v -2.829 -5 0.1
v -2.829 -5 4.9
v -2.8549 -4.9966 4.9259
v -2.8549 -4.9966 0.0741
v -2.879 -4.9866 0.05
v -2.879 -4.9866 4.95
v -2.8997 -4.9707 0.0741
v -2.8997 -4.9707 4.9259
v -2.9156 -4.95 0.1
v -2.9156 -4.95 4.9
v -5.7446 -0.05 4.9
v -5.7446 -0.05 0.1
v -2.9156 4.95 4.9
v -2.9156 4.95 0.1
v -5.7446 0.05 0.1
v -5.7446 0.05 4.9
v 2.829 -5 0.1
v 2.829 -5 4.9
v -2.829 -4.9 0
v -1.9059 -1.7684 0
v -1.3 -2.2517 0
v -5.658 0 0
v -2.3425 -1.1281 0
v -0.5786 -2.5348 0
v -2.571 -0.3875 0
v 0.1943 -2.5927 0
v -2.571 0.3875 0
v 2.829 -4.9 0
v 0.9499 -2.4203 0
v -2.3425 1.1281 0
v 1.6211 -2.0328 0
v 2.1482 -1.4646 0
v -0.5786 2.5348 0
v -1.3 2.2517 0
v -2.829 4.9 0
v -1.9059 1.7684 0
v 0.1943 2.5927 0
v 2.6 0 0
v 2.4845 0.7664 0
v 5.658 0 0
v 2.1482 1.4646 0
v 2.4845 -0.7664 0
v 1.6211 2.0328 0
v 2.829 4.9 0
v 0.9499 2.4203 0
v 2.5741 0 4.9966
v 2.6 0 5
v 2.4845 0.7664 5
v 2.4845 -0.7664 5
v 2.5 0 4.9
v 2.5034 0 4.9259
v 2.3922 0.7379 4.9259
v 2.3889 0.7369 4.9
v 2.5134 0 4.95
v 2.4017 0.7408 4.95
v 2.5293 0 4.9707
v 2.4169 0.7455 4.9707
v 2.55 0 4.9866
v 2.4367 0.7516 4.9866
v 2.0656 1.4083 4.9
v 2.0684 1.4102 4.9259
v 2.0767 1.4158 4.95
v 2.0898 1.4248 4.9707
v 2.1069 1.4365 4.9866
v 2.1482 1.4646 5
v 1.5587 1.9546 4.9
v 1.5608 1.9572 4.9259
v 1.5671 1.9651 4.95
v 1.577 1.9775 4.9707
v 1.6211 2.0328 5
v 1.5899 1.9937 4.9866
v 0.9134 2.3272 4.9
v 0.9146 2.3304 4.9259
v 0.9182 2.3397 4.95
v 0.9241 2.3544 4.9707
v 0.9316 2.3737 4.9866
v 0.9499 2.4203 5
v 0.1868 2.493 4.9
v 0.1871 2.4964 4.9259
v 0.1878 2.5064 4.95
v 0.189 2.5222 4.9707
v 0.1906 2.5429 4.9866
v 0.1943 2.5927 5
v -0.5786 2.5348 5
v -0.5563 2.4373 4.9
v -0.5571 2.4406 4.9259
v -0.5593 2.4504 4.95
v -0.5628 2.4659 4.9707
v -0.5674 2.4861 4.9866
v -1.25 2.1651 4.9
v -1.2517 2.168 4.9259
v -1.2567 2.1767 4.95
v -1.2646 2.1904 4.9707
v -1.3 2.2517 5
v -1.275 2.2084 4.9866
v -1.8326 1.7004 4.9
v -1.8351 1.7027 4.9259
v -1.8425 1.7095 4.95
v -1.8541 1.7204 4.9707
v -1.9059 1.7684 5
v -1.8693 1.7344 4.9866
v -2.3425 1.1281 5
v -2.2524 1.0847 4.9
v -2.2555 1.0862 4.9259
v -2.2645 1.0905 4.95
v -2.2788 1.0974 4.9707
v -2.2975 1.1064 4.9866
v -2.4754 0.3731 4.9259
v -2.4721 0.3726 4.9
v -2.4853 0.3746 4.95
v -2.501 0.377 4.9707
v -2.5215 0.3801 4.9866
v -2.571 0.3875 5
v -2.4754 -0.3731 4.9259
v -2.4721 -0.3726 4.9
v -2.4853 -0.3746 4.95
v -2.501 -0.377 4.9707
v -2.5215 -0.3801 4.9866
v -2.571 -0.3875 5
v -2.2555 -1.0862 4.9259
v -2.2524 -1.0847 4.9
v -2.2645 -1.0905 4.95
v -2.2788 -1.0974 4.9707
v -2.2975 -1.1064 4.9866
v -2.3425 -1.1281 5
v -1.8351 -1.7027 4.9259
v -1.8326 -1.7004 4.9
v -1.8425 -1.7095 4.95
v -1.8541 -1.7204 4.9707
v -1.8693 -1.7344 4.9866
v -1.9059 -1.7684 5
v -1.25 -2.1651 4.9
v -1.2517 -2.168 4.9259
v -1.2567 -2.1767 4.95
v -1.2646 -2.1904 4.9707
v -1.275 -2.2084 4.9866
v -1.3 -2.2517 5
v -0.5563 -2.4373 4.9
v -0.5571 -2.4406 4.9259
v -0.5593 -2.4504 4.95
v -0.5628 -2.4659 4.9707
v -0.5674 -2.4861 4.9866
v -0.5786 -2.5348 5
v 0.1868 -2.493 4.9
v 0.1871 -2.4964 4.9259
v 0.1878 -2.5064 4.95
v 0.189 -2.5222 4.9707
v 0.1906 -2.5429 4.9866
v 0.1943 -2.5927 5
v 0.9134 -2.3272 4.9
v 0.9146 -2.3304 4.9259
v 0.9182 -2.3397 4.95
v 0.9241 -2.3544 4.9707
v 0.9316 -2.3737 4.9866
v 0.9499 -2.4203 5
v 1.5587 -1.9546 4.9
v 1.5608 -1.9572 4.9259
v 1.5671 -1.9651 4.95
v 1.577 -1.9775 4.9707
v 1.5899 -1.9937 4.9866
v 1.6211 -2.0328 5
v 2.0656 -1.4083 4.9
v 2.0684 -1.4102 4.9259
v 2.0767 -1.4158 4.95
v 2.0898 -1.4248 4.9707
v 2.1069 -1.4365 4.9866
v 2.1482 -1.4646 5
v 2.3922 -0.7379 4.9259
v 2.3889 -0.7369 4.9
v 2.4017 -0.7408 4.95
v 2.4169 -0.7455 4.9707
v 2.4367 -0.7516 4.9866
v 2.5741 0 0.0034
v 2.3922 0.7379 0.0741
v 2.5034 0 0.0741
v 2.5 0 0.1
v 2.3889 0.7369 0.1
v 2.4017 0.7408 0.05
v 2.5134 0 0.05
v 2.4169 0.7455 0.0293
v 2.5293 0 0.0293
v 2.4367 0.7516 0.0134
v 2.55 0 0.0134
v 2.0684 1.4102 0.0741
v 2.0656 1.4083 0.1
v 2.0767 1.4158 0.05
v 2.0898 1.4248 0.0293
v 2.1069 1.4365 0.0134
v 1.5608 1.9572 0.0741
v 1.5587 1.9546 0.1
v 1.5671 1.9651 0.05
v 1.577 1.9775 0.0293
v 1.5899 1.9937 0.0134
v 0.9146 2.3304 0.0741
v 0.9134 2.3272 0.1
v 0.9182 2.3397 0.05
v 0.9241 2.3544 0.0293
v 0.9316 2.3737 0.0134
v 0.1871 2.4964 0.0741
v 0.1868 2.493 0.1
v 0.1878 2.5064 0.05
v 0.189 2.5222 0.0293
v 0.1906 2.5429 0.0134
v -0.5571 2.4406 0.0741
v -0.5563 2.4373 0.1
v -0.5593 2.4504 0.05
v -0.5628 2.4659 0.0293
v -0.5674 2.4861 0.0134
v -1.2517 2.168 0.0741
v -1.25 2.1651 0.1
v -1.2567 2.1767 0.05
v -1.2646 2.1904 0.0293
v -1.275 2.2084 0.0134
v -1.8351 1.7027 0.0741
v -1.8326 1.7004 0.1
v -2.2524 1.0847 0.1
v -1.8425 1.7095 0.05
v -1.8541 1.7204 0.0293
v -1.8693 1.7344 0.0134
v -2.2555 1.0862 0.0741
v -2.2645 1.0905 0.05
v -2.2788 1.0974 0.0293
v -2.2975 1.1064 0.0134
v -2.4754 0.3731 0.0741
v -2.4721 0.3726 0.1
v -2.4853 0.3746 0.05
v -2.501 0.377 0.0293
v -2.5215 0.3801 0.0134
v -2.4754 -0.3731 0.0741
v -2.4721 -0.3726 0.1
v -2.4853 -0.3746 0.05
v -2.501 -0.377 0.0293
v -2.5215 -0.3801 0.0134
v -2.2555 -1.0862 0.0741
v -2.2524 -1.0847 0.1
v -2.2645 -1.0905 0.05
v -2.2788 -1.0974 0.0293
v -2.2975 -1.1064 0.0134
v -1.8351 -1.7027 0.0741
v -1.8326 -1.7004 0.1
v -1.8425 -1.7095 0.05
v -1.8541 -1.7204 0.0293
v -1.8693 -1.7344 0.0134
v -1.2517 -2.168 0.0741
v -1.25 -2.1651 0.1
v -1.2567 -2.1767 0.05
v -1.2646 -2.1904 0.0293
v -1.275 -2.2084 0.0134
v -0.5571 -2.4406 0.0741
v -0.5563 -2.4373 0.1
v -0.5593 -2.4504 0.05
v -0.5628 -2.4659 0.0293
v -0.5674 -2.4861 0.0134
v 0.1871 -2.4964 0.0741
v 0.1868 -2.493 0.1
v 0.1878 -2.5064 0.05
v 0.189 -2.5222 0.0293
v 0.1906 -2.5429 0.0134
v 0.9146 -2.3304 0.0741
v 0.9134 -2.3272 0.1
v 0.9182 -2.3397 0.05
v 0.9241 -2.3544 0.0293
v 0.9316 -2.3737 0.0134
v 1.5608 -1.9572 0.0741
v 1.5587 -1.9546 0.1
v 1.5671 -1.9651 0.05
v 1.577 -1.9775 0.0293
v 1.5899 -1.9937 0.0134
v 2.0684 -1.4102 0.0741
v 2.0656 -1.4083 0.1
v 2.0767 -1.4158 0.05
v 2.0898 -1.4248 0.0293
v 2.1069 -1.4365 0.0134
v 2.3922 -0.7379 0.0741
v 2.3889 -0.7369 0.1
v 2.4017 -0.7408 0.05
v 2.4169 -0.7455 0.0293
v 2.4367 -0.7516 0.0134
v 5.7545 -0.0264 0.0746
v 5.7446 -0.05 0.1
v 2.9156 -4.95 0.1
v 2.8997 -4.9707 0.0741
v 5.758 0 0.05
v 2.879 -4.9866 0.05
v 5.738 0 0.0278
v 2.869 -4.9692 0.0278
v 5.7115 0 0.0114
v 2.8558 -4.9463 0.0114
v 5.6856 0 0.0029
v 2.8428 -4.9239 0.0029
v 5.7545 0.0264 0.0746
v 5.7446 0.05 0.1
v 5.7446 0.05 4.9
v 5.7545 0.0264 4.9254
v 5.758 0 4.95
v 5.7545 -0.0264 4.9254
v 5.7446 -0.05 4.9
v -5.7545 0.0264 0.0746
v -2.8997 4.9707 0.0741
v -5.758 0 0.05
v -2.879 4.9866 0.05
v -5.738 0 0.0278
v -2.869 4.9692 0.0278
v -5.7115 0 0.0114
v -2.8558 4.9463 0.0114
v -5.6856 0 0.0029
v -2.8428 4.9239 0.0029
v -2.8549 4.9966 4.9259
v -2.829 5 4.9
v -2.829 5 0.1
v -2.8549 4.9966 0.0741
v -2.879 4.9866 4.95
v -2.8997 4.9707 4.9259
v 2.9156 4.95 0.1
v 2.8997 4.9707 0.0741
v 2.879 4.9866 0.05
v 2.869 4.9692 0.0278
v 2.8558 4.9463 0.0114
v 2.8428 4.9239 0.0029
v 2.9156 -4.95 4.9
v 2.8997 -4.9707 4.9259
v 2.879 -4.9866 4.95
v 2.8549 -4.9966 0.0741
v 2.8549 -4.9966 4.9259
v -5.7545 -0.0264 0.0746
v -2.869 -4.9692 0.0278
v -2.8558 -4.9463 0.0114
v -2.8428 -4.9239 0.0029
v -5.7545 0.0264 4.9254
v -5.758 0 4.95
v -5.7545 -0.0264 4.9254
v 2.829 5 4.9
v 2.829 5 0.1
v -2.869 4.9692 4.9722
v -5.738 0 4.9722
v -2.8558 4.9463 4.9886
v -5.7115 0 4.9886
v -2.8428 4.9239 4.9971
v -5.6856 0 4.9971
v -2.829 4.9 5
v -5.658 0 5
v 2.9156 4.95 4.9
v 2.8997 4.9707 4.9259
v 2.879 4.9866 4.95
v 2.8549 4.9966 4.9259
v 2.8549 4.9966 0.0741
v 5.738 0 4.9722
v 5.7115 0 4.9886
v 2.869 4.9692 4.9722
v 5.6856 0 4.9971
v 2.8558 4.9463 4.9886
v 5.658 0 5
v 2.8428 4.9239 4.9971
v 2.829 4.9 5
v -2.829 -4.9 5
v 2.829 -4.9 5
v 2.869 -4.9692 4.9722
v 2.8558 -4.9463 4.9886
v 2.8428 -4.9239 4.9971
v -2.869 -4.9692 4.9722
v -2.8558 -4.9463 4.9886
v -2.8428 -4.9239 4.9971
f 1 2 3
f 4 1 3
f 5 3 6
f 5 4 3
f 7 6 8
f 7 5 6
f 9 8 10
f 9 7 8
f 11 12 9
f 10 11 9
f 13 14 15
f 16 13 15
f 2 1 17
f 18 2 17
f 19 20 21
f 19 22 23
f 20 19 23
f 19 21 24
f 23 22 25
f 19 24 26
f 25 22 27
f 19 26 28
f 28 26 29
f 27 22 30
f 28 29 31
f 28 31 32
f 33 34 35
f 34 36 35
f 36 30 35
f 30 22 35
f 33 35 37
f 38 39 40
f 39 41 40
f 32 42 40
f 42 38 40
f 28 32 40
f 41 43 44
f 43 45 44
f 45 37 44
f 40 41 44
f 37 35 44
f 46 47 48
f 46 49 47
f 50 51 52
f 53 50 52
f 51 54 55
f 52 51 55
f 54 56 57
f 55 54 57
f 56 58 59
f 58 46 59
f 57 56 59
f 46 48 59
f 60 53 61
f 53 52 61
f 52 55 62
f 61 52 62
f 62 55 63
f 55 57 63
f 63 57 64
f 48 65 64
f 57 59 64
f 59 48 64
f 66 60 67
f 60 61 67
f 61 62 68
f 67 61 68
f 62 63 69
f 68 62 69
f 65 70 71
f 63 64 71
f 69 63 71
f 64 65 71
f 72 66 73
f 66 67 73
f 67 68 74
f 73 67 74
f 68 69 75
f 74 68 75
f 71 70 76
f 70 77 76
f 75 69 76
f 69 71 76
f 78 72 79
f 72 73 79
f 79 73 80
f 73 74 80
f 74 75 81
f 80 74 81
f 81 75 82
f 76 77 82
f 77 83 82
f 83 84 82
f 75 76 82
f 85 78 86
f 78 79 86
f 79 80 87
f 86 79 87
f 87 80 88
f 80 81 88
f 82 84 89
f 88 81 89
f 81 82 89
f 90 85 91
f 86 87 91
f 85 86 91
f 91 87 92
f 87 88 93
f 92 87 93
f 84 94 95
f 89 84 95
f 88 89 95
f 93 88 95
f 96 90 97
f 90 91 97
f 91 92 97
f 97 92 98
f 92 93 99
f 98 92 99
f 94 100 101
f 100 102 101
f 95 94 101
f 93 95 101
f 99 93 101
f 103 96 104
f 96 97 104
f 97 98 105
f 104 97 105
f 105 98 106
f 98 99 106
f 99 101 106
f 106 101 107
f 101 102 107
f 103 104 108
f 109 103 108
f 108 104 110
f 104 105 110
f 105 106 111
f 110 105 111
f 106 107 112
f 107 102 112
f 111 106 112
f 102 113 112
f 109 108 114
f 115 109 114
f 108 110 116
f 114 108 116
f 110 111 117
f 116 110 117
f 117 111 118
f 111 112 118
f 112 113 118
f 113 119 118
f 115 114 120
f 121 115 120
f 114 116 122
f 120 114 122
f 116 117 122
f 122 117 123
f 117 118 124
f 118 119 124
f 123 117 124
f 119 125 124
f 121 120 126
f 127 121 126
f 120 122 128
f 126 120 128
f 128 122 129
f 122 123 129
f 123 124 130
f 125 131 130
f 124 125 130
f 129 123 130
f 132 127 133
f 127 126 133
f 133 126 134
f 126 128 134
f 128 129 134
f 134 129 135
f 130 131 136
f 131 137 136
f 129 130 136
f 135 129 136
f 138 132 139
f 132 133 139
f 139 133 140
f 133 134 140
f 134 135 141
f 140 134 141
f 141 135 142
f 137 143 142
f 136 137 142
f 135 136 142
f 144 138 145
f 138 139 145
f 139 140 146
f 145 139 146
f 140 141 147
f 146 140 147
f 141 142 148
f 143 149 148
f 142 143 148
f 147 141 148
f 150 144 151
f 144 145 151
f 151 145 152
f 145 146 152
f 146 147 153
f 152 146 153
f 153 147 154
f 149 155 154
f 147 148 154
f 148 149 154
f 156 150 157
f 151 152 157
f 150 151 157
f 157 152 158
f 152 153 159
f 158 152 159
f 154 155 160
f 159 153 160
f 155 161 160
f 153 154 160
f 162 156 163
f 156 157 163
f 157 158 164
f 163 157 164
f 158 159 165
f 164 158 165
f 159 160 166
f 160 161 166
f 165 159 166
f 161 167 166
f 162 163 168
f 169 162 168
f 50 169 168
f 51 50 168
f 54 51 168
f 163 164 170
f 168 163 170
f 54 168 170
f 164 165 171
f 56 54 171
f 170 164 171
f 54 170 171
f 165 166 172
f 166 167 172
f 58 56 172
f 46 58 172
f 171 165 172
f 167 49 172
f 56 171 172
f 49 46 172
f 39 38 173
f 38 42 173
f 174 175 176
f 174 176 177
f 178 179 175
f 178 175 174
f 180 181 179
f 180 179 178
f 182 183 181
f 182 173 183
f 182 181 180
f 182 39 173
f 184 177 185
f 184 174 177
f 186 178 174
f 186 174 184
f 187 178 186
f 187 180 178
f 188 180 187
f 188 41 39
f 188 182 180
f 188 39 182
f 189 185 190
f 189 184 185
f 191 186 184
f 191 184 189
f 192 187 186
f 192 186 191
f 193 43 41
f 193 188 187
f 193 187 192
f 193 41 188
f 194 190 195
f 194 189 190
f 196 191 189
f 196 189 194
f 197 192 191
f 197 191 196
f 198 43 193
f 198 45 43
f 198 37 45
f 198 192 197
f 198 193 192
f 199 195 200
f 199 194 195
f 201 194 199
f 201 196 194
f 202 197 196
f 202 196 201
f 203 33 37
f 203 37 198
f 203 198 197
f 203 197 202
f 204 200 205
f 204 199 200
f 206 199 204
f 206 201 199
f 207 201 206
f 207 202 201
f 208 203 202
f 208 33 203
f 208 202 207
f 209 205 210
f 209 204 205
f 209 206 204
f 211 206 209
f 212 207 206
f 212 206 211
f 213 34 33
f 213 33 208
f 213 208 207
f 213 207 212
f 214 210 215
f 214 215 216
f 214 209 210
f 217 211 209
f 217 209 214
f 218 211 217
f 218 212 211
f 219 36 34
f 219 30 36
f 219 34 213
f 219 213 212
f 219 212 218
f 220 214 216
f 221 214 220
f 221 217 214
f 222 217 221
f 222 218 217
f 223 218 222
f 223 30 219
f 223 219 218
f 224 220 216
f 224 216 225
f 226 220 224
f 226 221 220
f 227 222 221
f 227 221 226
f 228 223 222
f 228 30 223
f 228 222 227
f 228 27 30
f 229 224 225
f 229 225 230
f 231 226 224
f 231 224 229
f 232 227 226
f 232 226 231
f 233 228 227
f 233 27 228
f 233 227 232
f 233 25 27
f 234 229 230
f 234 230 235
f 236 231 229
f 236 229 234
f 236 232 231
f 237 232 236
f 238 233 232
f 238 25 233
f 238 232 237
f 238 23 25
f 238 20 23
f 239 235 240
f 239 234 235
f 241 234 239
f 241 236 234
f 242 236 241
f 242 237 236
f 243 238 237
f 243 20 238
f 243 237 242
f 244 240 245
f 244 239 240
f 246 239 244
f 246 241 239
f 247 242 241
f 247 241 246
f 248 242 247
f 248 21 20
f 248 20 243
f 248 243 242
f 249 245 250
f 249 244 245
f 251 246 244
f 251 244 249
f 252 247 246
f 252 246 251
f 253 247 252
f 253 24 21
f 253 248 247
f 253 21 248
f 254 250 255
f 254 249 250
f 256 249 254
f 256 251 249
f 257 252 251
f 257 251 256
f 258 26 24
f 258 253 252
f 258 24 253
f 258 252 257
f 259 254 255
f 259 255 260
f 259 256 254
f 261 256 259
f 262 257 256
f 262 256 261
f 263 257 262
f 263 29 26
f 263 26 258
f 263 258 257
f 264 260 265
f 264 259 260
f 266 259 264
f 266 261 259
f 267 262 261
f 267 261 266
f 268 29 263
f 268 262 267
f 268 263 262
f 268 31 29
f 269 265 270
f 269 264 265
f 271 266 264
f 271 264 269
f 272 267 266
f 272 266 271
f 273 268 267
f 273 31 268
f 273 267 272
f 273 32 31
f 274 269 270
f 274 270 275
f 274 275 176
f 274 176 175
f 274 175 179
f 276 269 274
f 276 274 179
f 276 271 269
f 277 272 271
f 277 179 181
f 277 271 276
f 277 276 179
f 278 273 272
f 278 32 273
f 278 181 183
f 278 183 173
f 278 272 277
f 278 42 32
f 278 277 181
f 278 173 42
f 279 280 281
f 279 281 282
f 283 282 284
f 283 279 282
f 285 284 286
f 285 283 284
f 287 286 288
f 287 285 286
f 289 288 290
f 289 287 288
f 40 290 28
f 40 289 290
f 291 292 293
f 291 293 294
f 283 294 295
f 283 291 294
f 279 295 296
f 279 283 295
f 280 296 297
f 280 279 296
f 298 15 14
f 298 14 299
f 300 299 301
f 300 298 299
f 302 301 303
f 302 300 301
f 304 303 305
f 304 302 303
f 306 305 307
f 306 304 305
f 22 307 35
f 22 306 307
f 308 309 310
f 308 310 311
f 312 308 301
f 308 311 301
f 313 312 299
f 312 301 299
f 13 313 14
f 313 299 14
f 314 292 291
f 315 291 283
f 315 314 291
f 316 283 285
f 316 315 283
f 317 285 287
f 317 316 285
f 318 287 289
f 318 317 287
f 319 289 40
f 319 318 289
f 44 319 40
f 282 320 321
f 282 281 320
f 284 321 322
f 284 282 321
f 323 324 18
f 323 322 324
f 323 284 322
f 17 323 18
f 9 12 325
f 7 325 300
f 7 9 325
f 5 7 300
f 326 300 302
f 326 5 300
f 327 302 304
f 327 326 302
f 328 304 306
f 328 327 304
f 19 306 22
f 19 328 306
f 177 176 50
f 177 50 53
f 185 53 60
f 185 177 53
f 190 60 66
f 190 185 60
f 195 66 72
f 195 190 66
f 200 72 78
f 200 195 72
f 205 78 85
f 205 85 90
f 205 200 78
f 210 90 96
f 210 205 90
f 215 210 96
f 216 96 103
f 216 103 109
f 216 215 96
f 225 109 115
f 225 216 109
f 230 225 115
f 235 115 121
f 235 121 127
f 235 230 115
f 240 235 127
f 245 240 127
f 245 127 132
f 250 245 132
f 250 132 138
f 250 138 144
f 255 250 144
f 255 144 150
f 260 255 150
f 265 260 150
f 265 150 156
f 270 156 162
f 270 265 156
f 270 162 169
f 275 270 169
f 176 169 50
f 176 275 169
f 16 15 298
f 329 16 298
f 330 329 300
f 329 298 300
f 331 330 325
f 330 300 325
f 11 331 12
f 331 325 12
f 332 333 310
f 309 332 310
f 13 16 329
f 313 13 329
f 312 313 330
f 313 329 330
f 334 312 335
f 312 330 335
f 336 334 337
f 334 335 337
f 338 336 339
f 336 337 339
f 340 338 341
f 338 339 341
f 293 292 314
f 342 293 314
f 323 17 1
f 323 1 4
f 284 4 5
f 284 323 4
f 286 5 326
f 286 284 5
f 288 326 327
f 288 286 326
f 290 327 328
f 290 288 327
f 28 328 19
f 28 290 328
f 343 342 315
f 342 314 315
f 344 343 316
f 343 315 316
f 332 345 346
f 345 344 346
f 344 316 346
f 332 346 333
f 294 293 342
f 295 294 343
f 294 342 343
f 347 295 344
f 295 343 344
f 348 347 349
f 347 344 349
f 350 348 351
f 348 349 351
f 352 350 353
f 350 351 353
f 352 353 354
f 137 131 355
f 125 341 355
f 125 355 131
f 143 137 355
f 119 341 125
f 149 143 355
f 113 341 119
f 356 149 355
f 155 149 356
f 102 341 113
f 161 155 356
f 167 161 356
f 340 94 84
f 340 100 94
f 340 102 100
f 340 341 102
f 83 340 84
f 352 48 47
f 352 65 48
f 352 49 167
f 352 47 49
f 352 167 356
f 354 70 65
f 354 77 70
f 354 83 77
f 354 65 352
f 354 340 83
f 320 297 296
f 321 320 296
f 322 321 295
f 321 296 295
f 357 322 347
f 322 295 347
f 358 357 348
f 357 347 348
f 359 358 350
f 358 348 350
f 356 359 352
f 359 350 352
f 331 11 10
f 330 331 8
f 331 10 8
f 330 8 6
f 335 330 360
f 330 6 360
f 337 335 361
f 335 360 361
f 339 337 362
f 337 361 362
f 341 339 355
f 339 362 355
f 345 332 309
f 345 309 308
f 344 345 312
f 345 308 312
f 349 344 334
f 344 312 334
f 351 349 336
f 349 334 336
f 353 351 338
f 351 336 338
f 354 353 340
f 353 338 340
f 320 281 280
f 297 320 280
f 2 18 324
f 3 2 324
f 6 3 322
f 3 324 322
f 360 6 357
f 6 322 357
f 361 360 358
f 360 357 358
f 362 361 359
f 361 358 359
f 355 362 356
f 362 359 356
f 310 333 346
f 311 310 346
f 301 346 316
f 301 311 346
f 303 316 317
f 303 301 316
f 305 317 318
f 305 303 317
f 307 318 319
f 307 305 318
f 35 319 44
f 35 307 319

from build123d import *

# Parameters (mm, degrees)
F0_R        = 2.5
F1_DEPTH    = 5
F2_R        = 0.1
F3_T1_DEPTH = 5.0886751346


# Not quite as in the source:
# - a fillet or chamfer that OpenCascade refuses, or shapes differently, is made with other operations: its cross-section is extruded or revolved along the edge and cut away or added


with BuildPart() as f1:
    # F0 (on Top) → F1 (new body)
    with BuildSketch(Plane.XY):
        Polygon((2.8867513459, 5), (-2.8867513459, 5), (-5.7735026919, 0), (-2.8867513459, -5), (2.8867513459, -5), (5.7735026919, 0), align=None)
        Circle(F0_R, mode=Mode.SUBTRACT)
    extrude(amount=F1_DEPTH)

    # F2
    f2_edges = [f1.edges().sort_by_distance(p)[0] for p in [
        (4.330127, 2.5, 0),
        (0, 5, 0),
        (-4.330127, 2.5, 0),
        (-4.330127, -2.5, 0),
        (0, -5, 0),
        (4.330127, -2.5, 0),
        (-2.5, 0, 0),
        (4.330127, 2.5, 5),
        (0, 5, 5),
        (-4.330127, 2.5, 5),
        (-4.330127, -2.5, 5),
        (0, -5, 5),
        (4.330127, -2.5, 5),
        (-2.5, 0, 5),
    ]]
    fillet(f2_edges, radius=F2_R)

    # F3: fillet of radius 0.1 on 18 edges, made by hand

    # F3_s2 → F3_t1 (cut)
    with BuildSketch(Plane.XY.offset(-0.0443375673)):
        with BuildLine():
            ThreePointArc((-2.829016319, 5), (-2.879016319, 4.9866025404), (-2.9156188594, 4.95))
            Line((-2.9156188594, 4.95), (-2.8867513459, 5))
            Line((-2.8867513459, 5), (-2.829016319, 5))
        make_face()
        with BuildLine():
            ThreePointArc((-5.7446351784, 0.05), (-5.7580326381, 0), (-5.7446351784, -0.05))
            Line((-5.7446351784, -0.05), (-5.7735026919, 0))
            Line((-5.7735026919, 0), (-5.7446351784, 0.05))
        make_face()
        with BuildLine():
            ThreePointArc((2.9156188594, 4.95), (2.879016319, 4.9866025404), (2.829016319, 5))
            Line((2.829016319, 5), (2.8867513459, 5))
            Line((2.8867513459, 5), (2.9156188594, 4.95))
        make_face()
        with BuildLine():
            ThreePointArc((5.7446351784, 0.05), (5.7580326381, 0), (5.7446351784, -0.05))
            Line((5.7446351784, -0.05), (5.7735026919, 0))
            Line((5.7735026919, 0), (5.7446351784, 0.05))
        make_face()
        with BuildLine():
            ThreePointArc((-2.829016319, -5), (-2.879016319, -4.9866025404), (-2.9156188594, -4.95))
            Line((-2.9156188594, -4.95), (-2.8867513459, -5))
            Line((-2.8867513459, -5), (-2.829016319, -5))
        make_face()
        with BuildLine():
            ThreePointArc((2.9156188594, -4.95), (2.879016319, -4.9866025404), (2.829016319, -5))
            Line((2.829016319, -5), (2.8867513459, -5))
            Line((2.8867513459, -5), (2.9156188594, -4.95))
        make_face()
    extrude(amount=F3_T1_DEPTH, mode=Mode.SUBTRACT)


solid = f1.part
